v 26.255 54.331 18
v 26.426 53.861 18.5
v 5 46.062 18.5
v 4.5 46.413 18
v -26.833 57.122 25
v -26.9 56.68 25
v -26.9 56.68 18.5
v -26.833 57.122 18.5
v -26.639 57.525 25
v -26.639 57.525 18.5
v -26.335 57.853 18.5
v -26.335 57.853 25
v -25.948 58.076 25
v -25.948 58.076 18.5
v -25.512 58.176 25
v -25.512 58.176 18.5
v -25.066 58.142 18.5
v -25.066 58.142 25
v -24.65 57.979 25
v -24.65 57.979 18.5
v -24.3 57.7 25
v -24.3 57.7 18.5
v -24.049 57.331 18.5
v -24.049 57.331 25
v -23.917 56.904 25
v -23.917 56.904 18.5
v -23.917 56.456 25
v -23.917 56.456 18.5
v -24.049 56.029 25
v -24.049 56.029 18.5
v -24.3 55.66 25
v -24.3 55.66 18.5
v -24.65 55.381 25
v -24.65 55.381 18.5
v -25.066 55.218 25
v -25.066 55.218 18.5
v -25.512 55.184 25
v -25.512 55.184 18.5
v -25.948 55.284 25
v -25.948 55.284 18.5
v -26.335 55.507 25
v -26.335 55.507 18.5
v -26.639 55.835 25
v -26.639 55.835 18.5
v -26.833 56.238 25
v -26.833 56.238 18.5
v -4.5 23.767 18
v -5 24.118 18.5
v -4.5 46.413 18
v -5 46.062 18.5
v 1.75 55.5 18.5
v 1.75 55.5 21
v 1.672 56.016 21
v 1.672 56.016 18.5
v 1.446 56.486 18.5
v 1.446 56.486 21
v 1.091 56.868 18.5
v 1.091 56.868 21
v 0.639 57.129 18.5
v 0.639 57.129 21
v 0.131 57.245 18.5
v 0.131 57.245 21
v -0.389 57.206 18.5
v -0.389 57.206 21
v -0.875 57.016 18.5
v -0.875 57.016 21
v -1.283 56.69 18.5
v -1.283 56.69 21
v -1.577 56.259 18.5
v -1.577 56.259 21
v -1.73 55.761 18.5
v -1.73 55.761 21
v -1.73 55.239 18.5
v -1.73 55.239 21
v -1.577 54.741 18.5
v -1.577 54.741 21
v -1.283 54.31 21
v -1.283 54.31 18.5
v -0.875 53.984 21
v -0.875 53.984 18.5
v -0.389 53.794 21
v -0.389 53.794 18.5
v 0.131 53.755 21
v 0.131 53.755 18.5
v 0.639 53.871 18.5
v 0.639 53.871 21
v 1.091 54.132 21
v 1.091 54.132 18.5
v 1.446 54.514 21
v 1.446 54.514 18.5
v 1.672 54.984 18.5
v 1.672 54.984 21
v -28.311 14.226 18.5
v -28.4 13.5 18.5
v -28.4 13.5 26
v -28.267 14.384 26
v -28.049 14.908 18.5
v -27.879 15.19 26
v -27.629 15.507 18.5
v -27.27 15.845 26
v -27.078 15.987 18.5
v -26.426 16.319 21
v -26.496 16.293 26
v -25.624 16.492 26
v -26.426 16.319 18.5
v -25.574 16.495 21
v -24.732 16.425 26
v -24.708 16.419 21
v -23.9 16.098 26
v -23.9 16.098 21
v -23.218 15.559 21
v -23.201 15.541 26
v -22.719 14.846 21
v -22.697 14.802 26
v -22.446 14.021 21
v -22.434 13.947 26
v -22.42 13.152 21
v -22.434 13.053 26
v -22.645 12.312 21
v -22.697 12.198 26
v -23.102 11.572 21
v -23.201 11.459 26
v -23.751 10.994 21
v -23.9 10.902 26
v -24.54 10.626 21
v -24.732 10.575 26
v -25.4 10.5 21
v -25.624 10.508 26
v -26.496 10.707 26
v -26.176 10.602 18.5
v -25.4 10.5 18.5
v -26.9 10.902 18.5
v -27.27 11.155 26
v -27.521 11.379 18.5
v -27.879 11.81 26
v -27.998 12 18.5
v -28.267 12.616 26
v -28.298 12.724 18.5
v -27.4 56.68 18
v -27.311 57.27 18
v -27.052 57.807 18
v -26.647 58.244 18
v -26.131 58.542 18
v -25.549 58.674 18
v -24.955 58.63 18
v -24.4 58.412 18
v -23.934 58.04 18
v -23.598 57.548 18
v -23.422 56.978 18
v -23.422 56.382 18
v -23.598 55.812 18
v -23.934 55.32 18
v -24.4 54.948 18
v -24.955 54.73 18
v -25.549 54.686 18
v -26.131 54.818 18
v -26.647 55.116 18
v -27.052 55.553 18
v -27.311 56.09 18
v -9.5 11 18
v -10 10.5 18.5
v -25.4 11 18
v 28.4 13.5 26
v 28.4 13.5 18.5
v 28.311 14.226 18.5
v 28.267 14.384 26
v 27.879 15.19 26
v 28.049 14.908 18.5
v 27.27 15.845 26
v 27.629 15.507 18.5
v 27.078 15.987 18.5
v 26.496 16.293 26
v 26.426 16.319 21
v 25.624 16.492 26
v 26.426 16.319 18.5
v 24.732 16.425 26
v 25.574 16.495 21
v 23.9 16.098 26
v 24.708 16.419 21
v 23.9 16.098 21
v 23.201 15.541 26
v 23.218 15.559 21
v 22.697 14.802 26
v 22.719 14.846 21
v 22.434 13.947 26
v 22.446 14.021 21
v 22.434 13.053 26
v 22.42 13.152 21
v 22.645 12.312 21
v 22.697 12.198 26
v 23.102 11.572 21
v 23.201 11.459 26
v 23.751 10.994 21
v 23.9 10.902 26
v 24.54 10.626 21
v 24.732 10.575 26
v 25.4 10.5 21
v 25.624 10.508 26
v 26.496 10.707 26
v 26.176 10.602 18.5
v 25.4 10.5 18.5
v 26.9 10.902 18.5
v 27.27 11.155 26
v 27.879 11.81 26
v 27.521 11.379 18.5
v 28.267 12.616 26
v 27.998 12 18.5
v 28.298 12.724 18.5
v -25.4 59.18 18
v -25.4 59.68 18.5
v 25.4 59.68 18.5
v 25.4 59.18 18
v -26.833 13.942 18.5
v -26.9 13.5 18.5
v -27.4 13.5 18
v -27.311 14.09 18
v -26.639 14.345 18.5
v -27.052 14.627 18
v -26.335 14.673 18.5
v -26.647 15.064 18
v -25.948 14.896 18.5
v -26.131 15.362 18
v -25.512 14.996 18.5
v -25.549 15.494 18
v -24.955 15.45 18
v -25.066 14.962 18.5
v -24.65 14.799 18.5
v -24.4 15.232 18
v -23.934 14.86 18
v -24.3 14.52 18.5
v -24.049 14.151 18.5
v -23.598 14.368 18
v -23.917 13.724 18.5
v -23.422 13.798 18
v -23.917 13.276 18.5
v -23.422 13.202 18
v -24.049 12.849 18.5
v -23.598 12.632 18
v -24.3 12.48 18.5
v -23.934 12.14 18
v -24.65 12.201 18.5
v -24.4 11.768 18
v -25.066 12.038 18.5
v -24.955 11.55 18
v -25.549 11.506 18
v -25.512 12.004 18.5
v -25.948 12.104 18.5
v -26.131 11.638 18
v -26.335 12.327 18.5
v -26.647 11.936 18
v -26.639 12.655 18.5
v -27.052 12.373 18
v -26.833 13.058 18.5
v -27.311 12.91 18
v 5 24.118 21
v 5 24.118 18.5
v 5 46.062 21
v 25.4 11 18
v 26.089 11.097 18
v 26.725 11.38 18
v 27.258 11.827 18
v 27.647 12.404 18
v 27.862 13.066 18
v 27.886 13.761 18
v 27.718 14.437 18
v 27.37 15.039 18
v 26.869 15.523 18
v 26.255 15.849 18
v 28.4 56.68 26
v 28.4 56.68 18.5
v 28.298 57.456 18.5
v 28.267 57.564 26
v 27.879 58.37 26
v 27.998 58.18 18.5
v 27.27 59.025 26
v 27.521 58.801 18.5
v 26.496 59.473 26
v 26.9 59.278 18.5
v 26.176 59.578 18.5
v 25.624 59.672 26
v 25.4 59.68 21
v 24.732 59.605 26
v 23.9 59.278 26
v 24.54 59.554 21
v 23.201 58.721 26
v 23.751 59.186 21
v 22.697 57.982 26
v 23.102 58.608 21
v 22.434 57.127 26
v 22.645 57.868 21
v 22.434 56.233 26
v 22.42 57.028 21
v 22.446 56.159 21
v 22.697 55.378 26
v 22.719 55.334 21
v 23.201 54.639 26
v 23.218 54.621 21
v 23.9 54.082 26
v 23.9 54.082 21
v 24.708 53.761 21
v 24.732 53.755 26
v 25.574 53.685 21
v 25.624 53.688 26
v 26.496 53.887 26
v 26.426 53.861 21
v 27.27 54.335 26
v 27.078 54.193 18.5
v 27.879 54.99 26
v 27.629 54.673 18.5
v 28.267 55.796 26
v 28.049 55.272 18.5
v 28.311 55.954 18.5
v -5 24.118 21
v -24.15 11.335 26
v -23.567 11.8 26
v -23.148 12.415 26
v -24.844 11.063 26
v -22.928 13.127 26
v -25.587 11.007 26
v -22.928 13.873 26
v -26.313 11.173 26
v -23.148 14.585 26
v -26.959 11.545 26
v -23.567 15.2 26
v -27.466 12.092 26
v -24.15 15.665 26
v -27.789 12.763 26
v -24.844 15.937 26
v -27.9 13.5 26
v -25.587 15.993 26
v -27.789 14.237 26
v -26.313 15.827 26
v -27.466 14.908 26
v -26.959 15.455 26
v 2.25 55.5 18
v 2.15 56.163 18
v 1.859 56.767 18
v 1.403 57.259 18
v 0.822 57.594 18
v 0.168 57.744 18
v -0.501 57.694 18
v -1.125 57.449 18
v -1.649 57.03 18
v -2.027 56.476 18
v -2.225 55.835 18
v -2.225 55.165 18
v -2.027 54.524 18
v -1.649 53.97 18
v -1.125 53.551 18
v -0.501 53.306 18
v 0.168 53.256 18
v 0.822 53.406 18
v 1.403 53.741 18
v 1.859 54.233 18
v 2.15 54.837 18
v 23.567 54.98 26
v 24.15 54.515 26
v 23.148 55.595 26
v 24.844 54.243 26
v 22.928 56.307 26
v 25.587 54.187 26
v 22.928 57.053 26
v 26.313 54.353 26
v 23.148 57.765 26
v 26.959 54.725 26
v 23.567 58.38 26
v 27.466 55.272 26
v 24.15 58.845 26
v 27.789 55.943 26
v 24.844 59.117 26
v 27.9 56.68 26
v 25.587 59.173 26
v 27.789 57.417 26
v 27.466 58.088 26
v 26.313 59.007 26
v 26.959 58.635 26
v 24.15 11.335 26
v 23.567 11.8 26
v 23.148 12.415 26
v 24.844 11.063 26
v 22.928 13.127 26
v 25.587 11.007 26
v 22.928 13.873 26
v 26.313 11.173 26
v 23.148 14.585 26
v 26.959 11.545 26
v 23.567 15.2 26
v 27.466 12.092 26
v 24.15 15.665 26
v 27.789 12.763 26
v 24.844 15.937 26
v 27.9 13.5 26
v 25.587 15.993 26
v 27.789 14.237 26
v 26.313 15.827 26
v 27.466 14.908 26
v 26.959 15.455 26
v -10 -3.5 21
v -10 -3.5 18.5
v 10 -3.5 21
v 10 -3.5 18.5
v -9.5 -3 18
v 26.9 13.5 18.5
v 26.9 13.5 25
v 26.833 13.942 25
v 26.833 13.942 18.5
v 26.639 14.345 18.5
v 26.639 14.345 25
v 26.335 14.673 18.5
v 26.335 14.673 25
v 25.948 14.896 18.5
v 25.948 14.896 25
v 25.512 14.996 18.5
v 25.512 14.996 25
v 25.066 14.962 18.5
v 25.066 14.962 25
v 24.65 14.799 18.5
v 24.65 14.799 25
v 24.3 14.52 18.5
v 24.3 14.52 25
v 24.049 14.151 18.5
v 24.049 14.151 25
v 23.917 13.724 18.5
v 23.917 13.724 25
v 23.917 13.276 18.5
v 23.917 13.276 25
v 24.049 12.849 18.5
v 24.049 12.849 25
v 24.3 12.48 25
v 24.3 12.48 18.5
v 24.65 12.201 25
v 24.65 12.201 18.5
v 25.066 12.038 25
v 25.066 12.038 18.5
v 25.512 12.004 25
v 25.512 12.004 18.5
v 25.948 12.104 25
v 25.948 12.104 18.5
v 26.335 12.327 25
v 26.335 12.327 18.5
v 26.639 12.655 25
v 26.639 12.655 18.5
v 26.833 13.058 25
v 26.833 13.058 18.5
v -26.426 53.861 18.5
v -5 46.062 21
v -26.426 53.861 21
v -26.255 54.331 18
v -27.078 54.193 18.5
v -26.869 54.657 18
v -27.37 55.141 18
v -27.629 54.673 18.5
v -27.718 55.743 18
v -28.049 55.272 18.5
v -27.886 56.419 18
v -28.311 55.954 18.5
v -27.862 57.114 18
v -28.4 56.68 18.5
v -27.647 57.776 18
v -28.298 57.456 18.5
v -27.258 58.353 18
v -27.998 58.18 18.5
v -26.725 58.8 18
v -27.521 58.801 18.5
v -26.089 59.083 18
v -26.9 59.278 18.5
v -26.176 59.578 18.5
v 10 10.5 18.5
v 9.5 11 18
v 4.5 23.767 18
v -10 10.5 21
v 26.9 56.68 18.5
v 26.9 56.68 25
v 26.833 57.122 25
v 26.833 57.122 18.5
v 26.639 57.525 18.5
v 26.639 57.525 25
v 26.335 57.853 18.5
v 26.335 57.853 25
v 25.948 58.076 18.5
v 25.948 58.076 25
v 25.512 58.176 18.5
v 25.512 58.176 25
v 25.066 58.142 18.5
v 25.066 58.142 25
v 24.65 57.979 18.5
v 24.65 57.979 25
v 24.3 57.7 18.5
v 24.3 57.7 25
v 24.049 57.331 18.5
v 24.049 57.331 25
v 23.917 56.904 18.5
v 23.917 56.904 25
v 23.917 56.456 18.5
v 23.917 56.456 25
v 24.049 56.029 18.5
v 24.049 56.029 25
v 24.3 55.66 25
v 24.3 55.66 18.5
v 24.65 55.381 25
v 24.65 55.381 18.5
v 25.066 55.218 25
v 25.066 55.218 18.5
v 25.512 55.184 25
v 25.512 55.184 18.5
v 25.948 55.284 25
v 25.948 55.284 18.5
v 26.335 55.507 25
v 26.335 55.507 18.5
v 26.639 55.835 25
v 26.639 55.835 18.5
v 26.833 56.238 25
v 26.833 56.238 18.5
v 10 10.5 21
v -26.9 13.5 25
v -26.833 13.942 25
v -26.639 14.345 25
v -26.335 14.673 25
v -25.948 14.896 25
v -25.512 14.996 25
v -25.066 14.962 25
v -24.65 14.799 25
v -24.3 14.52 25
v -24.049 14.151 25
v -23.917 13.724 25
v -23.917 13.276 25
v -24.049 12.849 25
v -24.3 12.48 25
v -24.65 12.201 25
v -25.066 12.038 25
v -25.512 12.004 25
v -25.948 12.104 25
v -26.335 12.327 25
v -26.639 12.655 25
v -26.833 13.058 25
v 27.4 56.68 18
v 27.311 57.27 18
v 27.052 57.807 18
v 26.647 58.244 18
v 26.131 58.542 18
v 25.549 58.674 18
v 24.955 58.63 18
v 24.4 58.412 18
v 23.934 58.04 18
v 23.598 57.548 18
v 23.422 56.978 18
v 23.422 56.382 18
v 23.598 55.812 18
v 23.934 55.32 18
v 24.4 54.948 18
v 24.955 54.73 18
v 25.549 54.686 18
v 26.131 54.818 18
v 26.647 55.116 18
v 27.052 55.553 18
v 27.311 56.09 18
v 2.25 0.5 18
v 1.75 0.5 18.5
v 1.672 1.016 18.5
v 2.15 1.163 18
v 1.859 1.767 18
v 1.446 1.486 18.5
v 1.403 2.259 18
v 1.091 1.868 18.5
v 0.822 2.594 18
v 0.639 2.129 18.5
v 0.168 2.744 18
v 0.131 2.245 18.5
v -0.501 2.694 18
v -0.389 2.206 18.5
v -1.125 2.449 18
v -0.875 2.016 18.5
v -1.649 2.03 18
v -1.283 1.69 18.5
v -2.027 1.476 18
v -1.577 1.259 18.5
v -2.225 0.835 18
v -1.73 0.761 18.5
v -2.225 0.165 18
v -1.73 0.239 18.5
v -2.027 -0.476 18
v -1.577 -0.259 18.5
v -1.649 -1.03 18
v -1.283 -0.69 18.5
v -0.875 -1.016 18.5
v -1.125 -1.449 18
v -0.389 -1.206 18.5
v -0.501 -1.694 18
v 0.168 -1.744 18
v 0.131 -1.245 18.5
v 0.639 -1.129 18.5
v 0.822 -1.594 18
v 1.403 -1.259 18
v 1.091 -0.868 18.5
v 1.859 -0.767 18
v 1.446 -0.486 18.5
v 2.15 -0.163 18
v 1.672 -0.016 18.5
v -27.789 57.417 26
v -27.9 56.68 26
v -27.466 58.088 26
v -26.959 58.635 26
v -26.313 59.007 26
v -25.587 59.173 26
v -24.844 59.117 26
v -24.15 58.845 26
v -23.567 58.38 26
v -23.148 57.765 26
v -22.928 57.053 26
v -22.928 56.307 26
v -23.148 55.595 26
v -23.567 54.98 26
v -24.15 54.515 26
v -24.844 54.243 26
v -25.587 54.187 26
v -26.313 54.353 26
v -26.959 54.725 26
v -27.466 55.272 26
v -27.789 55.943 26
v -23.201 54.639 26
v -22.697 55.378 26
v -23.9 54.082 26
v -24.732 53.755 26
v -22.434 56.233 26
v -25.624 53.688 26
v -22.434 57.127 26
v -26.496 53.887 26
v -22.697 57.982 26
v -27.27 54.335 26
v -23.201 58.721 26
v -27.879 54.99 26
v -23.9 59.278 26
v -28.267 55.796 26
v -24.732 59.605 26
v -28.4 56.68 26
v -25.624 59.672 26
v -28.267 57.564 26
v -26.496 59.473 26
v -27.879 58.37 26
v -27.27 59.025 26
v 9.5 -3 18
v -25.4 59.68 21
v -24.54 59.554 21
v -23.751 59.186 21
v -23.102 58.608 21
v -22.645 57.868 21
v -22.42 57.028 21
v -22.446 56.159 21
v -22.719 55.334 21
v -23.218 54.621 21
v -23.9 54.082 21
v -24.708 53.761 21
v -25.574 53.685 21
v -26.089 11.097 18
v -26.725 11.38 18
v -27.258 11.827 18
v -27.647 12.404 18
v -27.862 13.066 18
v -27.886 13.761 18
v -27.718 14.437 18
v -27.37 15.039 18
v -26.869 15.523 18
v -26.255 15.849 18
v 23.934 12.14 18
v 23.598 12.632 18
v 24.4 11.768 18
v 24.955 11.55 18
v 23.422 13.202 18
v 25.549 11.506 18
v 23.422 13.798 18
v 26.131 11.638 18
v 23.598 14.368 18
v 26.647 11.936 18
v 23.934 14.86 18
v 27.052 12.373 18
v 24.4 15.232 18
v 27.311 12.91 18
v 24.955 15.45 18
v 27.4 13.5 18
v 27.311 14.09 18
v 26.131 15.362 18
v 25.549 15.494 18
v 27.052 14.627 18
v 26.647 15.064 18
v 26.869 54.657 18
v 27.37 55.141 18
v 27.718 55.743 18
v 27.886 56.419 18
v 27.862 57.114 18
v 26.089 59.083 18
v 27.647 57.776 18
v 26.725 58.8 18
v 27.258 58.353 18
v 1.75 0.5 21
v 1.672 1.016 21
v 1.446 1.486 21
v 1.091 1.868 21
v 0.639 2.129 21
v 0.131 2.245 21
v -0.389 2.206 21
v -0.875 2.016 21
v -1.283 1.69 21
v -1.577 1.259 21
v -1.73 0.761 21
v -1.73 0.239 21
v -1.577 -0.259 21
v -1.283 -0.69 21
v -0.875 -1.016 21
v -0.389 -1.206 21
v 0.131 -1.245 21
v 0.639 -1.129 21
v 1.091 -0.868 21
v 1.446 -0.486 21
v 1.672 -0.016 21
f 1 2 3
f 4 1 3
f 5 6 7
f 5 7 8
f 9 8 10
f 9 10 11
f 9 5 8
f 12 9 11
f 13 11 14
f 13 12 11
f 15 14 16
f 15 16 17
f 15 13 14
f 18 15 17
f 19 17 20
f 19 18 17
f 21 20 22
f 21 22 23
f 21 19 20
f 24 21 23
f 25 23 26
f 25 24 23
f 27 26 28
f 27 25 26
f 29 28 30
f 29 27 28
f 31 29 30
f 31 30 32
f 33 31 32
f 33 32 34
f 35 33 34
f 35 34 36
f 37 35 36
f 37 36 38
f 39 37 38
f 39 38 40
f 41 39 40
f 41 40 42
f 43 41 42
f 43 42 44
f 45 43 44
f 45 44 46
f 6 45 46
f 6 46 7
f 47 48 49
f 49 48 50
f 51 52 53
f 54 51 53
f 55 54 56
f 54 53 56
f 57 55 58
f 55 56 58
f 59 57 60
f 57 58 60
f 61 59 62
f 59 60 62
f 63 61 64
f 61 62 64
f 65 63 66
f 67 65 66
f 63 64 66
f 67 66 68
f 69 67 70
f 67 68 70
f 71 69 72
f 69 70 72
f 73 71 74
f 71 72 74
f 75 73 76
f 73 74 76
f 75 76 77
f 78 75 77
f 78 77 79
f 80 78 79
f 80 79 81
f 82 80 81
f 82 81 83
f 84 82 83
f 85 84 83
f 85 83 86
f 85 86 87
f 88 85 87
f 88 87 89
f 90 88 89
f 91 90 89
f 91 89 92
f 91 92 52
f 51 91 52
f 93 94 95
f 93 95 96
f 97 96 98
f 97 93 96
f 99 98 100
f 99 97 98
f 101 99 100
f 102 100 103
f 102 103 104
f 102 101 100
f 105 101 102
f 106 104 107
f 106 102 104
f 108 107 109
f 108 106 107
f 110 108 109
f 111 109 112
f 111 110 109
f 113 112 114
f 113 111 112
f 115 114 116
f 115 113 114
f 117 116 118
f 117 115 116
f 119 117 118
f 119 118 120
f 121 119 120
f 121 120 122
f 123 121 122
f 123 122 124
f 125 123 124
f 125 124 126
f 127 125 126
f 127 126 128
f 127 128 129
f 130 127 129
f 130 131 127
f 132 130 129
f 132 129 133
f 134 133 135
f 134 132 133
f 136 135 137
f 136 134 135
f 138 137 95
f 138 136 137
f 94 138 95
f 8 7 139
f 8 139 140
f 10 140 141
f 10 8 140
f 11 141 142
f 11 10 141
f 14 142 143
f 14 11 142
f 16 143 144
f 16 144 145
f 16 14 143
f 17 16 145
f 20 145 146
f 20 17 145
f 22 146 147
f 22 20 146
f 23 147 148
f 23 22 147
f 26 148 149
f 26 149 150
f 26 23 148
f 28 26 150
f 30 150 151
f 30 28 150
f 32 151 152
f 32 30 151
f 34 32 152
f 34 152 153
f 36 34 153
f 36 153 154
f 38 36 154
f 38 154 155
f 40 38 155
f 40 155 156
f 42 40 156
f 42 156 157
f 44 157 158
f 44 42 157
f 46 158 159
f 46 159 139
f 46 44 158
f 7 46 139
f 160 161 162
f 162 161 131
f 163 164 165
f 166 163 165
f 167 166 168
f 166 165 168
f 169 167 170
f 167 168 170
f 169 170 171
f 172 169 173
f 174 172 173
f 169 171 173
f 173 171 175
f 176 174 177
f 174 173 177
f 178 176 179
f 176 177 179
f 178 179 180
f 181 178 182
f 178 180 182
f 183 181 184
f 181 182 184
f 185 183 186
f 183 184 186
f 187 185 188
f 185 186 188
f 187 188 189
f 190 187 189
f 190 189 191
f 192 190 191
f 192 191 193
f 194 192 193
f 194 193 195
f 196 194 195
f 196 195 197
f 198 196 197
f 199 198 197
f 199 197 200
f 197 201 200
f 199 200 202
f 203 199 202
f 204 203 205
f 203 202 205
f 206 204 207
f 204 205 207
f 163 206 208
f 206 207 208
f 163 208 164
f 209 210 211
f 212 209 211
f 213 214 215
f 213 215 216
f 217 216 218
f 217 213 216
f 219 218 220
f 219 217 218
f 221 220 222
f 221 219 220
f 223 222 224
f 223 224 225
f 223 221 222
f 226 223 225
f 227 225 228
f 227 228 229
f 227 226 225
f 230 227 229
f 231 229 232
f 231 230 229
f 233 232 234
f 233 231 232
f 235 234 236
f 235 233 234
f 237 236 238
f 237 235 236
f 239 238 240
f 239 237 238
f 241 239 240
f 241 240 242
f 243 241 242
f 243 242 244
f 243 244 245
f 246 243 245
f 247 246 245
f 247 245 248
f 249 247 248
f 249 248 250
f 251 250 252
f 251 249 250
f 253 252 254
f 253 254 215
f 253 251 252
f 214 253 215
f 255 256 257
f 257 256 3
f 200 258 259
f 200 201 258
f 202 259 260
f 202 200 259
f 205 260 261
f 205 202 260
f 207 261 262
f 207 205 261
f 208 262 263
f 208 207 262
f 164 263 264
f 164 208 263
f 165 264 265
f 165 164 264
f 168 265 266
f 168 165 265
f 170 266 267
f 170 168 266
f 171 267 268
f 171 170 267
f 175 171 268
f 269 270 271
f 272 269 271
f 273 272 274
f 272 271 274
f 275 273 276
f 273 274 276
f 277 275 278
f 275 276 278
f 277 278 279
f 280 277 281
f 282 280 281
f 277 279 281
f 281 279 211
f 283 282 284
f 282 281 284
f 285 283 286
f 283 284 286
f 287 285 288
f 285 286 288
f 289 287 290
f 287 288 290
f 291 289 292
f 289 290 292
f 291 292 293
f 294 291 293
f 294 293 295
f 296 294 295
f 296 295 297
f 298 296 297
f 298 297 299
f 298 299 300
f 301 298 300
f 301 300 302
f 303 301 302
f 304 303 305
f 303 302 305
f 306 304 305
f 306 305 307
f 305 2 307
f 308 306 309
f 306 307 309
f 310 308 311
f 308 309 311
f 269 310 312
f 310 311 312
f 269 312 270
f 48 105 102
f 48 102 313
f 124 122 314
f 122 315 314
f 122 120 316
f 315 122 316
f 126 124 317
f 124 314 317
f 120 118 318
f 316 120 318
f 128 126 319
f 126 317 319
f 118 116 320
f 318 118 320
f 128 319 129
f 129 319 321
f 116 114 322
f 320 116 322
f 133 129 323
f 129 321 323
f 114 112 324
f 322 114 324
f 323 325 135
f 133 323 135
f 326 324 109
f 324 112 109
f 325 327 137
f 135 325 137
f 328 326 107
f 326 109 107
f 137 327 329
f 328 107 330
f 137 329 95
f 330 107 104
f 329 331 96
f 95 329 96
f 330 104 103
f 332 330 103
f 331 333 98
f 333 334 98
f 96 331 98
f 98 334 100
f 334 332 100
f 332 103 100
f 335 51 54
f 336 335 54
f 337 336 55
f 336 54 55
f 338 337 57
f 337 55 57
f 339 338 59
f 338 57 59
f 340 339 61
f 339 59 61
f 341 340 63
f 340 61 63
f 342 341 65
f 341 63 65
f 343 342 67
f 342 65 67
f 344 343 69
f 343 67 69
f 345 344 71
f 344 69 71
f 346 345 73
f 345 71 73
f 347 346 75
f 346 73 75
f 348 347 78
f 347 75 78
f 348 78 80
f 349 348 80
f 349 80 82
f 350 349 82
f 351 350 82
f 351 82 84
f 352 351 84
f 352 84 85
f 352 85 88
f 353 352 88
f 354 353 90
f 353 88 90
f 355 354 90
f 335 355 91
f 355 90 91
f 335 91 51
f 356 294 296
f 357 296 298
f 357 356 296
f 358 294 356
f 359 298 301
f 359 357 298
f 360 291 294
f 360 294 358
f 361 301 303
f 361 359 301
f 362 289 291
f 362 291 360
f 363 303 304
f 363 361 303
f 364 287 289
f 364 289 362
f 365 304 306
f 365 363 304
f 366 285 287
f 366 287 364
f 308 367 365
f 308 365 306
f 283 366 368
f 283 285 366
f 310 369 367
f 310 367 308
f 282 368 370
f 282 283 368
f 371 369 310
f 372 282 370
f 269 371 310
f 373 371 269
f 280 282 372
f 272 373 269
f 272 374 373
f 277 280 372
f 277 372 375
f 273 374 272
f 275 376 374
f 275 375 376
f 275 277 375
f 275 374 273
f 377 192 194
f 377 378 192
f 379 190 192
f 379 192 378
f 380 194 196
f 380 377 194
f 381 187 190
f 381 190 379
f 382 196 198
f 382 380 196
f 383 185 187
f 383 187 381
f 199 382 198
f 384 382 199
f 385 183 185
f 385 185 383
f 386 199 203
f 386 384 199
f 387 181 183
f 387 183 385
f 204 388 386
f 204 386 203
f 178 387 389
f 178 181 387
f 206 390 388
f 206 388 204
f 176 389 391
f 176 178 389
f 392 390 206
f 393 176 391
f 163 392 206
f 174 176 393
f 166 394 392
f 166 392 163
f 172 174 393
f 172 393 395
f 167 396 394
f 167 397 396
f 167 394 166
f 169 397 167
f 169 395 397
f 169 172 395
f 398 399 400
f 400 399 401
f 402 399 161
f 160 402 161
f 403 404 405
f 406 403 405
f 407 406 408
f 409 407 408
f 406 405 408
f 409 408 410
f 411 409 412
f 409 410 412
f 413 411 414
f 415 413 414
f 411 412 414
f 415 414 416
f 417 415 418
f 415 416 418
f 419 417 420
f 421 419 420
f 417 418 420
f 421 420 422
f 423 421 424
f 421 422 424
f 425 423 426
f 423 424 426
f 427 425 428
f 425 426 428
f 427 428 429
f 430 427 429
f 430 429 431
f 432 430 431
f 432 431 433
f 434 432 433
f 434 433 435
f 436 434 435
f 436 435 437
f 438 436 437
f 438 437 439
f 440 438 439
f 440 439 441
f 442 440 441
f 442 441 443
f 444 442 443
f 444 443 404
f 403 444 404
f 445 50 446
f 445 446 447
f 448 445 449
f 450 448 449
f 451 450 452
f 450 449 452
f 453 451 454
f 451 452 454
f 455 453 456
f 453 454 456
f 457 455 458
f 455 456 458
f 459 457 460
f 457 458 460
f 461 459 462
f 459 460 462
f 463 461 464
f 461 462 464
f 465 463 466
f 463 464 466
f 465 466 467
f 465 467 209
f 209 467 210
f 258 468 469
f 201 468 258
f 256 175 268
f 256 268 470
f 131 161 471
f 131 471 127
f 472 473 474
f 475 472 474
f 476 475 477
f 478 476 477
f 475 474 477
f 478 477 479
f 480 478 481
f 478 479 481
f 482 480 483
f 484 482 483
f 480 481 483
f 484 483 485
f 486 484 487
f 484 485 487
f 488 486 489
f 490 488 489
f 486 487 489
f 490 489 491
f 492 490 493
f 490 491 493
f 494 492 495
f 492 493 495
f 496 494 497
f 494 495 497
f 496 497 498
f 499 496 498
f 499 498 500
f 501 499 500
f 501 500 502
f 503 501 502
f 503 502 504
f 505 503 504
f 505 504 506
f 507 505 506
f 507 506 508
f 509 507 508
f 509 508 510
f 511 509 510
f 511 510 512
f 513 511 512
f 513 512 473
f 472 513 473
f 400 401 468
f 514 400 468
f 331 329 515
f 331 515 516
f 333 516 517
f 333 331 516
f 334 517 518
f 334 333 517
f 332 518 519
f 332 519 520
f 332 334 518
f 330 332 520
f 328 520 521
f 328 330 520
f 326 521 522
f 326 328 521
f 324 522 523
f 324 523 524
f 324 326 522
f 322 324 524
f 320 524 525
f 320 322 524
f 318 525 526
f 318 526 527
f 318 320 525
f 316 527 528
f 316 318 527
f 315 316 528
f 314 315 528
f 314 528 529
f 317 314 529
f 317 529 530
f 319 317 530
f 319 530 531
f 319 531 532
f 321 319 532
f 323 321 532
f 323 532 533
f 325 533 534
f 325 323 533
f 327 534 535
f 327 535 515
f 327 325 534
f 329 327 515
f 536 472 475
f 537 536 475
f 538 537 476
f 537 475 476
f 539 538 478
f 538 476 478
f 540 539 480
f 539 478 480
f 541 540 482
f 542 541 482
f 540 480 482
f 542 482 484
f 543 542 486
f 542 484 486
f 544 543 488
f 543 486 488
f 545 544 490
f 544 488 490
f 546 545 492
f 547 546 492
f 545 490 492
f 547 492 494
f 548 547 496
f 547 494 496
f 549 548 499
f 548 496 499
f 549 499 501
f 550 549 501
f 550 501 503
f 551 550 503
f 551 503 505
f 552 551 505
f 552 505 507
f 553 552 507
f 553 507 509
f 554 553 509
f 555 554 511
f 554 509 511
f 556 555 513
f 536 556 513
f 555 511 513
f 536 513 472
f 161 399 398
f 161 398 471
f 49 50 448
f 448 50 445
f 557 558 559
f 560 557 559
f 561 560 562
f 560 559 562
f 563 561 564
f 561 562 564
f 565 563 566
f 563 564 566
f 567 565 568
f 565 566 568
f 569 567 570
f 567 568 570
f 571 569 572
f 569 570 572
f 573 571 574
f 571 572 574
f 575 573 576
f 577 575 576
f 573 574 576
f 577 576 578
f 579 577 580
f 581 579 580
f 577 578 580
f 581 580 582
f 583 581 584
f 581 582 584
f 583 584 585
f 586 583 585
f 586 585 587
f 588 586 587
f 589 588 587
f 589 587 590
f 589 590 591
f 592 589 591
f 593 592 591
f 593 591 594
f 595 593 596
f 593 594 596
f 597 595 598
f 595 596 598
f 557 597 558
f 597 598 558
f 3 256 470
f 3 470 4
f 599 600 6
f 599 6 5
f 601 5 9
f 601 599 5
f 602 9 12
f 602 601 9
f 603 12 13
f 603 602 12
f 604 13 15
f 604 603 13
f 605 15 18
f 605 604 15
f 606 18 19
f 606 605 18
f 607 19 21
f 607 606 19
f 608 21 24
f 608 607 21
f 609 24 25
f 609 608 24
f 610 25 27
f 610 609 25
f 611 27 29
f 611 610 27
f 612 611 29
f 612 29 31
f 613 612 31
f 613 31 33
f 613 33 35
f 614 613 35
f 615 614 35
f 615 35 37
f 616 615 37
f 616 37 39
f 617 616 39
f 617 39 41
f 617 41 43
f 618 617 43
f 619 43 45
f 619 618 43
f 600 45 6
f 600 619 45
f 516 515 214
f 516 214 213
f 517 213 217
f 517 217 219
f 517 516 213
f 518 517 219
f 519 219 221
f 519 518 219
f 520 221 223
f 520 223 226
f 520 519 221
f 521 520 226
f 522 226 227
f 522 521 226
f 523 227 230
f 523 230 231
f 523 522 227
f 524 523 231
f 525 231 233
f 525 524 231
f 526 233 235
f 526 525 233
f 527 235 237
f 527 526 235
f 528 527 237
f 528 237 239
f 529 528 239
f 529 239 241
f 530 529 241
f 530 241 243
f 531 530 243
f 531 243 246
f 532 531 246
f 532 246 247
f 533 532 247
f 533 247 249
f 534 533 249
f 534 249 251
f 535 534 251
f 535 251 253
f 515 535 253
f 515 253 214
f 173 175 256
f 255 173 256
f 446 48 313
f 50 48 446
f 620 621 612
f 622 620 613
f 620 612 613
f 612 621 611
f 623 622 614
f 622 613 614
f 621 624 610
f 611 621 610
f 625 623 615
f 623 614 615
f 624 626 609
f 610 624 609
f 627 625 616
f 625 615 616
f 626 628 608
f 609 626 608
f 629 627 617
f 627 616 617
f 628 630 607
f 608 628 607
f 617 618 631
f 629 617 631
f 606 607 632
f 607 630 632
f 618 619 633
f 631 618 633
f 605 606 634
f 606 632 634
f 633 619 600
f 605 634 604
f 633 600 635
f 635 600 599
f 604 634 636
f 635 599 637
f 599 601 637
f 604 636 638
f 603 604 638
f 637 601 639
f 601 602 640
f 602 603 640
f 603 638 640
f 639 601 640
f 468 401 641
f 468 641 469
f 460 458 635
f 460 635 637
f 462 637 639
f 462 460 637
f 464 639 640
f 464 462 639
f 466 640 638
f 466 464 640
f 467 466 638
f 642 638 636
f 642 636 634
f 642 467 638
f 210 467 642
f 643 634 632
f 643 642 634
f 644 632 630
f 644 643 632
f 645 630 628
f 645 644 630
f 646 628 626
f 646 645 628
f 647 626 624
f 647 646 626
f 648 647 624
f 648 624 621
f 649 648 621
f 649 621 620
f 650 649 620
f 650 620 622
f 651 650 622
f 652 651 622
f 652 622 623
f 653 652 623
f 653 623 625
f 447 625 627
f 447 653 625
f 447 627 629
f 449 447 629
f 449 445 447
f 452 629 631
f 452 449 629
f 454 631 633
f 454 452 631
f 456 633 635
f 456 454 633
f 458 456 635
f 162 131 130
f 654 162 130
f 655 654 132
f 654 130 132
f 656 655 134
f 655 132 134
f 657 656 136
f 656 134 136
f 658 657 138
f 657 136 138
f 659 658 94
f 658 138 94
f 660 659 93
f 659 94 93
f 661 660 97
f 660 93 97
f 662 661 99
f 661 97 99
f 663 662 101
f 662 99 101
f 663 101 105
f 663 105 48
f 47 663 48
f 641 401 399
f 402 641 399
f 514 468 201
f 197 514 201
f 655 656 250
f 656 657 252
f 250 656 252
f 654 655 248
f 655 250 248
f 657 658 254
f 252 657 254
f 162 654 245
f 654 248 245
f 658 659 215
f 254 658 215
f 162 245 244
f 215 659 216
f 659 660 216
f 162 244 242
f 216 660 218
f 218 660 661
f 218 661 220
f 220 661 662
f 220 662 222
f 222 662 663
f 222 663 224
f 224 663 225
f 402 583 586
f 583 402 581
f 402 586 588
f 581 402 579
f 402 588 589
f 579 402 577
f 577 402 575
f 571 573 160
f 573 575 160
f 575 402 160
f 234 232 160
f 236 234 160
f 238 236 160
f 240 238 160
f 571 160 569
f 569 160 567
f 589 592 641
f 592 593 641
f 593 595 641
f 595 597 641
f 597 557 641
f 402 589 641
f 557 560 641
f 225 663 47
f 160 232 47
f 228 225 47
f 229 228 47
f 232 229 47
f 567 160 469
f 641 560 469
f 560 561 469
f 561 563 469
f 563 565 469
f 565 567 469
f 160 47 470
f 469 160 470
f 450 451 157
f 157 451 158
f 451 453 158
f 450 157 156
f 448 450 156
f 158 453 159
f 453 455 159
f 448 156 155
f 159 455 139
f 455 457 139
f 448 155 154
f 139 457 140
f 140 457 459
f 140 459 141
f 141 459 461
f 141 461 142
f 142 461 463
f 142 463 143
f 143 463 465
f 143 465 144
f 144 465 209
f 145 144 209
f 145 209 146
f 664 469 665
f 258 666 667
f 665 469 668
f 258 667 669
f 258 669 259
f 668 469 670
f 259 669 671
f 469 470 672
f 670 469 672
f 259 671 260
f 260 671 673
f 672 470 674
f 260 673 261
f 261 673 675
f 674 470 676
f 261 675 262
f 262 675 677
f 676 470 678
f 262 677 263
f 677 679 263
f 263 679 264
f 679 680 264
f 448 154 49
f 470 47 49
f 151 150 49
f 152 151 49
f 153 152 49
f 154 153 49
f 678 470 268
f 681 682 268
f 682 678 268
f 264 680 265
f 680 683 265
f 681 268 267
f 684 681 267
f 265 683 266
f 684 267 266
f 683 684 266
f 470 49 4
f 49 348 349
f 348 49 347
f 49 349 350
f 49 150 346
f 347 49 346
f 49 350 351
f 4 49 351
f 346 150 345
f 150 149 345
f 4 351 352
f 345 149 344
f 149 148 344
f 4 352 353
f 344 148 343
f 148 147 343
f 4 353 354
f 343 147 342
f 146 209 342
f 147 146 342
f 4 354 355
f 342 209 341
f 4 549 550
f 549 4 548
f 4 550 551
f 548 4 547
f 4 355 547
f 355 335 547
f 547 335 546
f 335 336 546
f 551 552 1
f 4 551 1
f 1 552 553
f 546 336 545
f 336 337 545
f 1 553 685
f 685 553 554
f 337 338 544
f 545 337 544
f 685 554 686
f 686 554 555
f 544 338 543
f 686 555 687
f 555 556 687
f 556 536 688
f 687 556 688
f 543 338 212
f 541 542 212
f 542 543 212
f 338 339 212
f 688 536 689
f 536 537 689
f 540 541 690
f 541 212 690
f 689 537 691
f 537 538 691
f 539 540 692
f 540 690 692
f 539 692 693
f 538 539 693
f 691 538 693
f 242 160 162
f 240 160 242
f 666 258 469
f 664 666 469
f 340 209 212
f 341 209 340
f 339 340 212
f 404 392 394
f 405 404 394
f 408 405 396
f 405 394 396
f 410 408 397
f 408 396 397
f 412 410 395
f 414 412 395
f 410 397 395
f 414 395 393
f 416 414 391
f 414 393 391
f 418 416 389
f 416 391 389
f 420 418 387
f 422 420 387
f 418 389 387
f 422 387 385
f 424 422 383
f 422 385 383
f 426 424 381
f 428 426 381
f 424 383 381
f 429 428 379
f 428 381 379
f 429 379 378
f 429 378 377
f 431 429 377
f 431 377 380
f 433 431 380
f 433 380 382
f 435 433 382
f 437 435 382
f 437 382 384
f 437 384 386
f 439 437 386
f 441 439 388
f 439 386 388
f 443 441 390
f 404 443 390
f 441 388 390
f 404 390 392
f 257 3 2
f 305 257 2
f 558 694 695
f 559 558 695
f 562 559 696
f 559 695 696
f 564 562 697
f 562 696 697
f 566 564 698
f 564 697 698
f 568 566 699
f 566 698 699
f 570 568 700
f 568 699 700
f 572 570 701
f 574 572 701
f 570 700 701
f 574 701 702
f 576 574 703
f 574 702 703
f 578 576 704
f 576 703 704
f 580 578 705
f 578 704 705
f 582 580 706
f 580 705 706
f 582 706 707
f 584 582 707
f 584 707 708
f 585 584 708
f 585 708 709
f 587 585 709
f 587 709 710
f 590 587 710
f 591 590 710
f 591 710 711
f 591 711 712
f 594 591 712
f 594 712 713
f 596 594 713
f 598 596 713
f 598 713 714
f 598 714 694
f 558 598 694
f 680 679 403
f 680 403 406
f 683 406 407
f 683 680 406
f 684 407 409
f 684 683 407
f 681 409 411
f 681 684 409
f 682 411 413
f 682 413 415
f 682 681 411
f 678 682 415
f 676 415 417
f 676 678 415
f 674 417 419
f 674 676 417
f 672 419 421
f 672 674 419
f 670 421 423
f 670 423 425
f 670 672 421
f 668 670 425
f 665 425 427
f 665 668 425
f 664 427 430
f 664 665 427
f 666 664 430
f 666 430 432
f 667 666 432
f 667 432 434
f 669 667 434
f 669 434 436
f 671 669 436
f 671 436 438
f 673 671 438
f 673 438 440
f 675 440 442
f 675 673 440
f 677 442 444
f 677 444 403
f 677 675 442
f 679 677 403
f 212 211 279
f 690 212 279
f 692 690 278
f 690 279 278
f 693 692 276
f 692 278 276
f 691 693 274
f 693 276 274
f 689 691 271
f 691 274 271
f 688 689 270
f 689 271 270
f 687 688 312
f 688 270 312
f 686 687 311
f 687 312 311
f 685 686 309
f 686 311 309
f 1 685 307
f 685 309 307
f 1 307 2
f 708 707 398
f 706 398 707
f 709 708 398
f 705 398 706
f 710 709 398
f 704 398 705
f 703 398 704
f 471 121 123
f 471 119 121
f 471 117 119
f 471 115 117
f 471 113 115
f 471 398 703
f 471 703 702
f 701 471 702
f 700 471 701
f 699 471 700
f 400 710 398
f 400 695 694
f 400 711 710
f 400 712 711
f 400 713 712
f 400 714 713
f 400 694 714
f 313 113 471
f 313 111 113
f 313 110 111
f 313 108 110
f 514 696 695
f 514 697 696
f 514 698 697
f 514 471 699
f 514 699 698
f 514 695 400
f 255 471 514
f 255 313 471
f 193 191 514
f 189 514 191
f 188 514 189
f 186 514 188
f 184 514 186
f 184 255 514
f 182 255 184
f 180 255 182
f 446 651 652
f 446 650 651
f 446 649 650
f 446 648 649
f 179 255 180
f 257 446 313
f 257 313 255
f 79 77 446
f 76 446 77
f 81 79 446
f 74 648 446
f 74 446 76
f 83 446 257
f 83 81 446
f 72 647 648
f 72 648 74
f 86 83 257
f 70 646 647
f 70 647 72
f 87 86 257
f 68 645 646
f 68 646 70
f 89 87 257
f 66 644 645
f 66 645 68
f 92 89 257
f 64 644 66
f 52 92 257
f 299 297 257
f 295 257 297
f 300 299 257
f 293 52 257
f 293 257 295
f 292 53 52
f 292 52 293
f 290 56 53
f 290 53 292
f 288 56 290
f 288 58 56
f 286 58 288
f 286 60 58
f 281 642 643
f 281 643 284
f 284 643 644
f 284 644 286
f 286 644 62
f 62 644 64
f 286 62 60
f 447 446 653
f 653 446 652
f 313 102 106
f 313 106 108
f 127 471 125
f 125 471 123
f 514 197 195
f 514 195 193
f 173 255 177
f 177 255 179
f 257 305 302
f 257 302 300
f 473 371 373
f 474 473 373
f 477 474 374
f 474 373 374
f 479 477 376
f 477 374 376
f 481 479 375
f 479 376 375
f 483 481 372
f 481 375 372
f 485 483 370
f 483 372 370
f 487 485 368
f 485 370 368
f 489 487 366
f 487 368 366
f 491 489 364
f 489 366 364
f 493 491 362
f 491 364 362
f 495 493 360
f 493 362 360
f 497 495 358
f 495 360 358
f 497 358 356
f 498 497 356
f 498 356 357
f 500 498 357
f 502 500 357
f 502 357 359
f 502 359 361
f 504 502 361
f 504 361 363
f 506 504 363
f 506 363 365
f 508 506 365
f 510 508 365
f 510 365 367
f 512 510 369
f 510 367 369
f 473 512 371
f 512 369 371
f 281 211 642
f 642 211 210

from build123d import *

# Parameters (mm, degrees)
CYLINDER001_R     = 3
CYLINDER001_DEPTH = 8
PAD007_DEPTH      = 3
CYLINDER002_R     = 3
CYLINDER002_DEPTH = 8
SKETCH029_R       = 1.5
POCKET021_DEPTH   = 10
CHAMFER018_SIZE   = 1
SKETCH030_R       = 1.75
POCKET022_DEPTH   = 5
CHAMFER019_SIZE   = 0.5


with BuildPart() as keypadbracketscrewcylinder:
    # Cylinder001 → Cylinder001 (new body)
    with BuildSketch(Plane(origin=(25.4, 13.5, 18), x_dir=(1, 0, 0), z_dir=(0, 0, 1))):
        Circle(CYLINDER001_R)
    extrude(amount=CYLINDER001_DEPTH)


with BuildPart() as keypadbracketpad007:
    # Sketch028 → Pad007 (new body)
    with BuildSketch(Plane.XY.offset(18)):
        with BuildLine():
            Line((0, -3.5), (10, -3.5))
            Line((10, -3.5), (10, 10.5))
            Line((10, 10.5), (25.4, 10.5))
            ThreePointArc((25.4, 10.5), (28.354423, 12.979055), (26.42606, 16.319078))
            Line((26.42606, 16.319078), (5, 24.117526))
            Line((5, 24.117526), (5, 46.062474))
            Line((5, 46.062474), (26.42606, 53.860922))
            ThreePointArc((26.42606, 53.860922), (28.354423, 57.200945), (25.4, 59.68))
            Line((25.4, 59.68), (0, 59.68))
            Line((0, 59.68), (0, -3.5))
        make_face()
    extrude(amount=PAD007_DEPTH)


with BuildPart() as keypadbracketscrewholeschamfer018:
    # Cylinder002 → Cylinder002 (new body)
    with BuildSketch(Plane(origin=(25.4, 56.68, 18), x_dir=(1, 0, 0), z_dir=(0, 0, 1))):
        Circle(CYLINDER002_R)
    extrude(amount=CYLINDER002_DEPTH)

    # Fusion003: union KeypadBracketScrewCylinder, KeypadBracketPad007
    add(keypadbracketscrewcylinder.part)
    add(keypadbracketpad007.part)

    # Sketch029 → Pocket021 (cut)
    with BuildSketch(Plane.XY.offset(26)):
        with Locations((25.4, 13.5)):
            Circle(SKETCH029_R)
        with Locations((25.4, 56.68)):
            Circle(SKETCH029_R)
    extrude(amount=-POCKET021_DEPTH, mode=Mode.SUBTRACT)

    # Chamfer018
    chamfer018_edges = [keypadbracketscrewholeschamfer018.edges().sort_by_distance(p)[0] for p in [
        (23.9, 56.68, 26),
        (23.9, 13.5, 26),
    ]]
    chamfer(chamfer018_edges, length=CHAMFER018_SIZE)


with BuildPart() as keypadbracketprintingchamfer019_final:
    # Part__Mirroring004: instance of KeypadBracketScrewHolesChamfer018
    add(keypadbracketscrewholeschamfer018.part.mirror(Plane(origin=(0, 0, 0), x_dir=(0, -1, 0), z_dir=(1, 0, 0))))

    # Fusion004: union KeypadBracketScrewHolesChamfer018
    add(keypadbracketscrewholeschamfer018.part)

    # Sketch030 → Pocket022 (cut)
    with BuildSketch(Plane.XY.offset(21)):
        with Locations((0, 0.5)):
            Circle(SKETCH030_R)
        with Locations((0, 55.5)):
            Circle(SKETCH030_R)
    extrude(amount=-POCKET022_DEPTH, mode=Mode.SUBTRACT)

    # Chamfer019
    chamfer019_edges = [keypadbracketprintingchamfer019_final.edges().sort_by_distance(p)[0] for p in [
        (-25.4, 15, 18),
        (-25.4, 12, 18),
        (0, 57.25, 18),
        (0, 53.75, 18),
        (0, 2.25, 18),
        (0, -1.25, 18),
        (-27.52132, 58.80132, 18),
        (-27.857456, 54.959271, 18),
        (0, 59.68, 18),
        (-15.71303, 49.961698, 18),
        (27.52132, 58.80132, 18),
        (-5, 35.09, 18),
        (27.857456, 54.959271, 18),
        (-15.71303, 20.218302, 18),
        (15.71303, 49.961698, 18),
        (-27.857456, 15.220729, 18),
        (5, 35.09, 18),
        (-27.52132, 11.37868, 18),
        (15.71303, 20.218302, 18),
        (-17.7, 10.5, 18),
        (27.857456, 15.220729, 18),
        (-10, 3.5, 18),
        (27.52132, 11.37868, 18),
        (0, -3.5, 18),
        (17.7, 10.5, 18),
        (10, 3.5, 18),
        (25.4, 58.18, 18),
        (25.4, 55.18, 18),
        (25.4, 15, 18),
        (25.4, 12, 18),
        (-25.4, 58.18, 18),
        (-25.4, 55.18, 18),
    ]]
    chamfer(chamfer019_edges, length=CHAMFER019_SIZE)


solid = keypadbracketprintingchamfer019_final.part
